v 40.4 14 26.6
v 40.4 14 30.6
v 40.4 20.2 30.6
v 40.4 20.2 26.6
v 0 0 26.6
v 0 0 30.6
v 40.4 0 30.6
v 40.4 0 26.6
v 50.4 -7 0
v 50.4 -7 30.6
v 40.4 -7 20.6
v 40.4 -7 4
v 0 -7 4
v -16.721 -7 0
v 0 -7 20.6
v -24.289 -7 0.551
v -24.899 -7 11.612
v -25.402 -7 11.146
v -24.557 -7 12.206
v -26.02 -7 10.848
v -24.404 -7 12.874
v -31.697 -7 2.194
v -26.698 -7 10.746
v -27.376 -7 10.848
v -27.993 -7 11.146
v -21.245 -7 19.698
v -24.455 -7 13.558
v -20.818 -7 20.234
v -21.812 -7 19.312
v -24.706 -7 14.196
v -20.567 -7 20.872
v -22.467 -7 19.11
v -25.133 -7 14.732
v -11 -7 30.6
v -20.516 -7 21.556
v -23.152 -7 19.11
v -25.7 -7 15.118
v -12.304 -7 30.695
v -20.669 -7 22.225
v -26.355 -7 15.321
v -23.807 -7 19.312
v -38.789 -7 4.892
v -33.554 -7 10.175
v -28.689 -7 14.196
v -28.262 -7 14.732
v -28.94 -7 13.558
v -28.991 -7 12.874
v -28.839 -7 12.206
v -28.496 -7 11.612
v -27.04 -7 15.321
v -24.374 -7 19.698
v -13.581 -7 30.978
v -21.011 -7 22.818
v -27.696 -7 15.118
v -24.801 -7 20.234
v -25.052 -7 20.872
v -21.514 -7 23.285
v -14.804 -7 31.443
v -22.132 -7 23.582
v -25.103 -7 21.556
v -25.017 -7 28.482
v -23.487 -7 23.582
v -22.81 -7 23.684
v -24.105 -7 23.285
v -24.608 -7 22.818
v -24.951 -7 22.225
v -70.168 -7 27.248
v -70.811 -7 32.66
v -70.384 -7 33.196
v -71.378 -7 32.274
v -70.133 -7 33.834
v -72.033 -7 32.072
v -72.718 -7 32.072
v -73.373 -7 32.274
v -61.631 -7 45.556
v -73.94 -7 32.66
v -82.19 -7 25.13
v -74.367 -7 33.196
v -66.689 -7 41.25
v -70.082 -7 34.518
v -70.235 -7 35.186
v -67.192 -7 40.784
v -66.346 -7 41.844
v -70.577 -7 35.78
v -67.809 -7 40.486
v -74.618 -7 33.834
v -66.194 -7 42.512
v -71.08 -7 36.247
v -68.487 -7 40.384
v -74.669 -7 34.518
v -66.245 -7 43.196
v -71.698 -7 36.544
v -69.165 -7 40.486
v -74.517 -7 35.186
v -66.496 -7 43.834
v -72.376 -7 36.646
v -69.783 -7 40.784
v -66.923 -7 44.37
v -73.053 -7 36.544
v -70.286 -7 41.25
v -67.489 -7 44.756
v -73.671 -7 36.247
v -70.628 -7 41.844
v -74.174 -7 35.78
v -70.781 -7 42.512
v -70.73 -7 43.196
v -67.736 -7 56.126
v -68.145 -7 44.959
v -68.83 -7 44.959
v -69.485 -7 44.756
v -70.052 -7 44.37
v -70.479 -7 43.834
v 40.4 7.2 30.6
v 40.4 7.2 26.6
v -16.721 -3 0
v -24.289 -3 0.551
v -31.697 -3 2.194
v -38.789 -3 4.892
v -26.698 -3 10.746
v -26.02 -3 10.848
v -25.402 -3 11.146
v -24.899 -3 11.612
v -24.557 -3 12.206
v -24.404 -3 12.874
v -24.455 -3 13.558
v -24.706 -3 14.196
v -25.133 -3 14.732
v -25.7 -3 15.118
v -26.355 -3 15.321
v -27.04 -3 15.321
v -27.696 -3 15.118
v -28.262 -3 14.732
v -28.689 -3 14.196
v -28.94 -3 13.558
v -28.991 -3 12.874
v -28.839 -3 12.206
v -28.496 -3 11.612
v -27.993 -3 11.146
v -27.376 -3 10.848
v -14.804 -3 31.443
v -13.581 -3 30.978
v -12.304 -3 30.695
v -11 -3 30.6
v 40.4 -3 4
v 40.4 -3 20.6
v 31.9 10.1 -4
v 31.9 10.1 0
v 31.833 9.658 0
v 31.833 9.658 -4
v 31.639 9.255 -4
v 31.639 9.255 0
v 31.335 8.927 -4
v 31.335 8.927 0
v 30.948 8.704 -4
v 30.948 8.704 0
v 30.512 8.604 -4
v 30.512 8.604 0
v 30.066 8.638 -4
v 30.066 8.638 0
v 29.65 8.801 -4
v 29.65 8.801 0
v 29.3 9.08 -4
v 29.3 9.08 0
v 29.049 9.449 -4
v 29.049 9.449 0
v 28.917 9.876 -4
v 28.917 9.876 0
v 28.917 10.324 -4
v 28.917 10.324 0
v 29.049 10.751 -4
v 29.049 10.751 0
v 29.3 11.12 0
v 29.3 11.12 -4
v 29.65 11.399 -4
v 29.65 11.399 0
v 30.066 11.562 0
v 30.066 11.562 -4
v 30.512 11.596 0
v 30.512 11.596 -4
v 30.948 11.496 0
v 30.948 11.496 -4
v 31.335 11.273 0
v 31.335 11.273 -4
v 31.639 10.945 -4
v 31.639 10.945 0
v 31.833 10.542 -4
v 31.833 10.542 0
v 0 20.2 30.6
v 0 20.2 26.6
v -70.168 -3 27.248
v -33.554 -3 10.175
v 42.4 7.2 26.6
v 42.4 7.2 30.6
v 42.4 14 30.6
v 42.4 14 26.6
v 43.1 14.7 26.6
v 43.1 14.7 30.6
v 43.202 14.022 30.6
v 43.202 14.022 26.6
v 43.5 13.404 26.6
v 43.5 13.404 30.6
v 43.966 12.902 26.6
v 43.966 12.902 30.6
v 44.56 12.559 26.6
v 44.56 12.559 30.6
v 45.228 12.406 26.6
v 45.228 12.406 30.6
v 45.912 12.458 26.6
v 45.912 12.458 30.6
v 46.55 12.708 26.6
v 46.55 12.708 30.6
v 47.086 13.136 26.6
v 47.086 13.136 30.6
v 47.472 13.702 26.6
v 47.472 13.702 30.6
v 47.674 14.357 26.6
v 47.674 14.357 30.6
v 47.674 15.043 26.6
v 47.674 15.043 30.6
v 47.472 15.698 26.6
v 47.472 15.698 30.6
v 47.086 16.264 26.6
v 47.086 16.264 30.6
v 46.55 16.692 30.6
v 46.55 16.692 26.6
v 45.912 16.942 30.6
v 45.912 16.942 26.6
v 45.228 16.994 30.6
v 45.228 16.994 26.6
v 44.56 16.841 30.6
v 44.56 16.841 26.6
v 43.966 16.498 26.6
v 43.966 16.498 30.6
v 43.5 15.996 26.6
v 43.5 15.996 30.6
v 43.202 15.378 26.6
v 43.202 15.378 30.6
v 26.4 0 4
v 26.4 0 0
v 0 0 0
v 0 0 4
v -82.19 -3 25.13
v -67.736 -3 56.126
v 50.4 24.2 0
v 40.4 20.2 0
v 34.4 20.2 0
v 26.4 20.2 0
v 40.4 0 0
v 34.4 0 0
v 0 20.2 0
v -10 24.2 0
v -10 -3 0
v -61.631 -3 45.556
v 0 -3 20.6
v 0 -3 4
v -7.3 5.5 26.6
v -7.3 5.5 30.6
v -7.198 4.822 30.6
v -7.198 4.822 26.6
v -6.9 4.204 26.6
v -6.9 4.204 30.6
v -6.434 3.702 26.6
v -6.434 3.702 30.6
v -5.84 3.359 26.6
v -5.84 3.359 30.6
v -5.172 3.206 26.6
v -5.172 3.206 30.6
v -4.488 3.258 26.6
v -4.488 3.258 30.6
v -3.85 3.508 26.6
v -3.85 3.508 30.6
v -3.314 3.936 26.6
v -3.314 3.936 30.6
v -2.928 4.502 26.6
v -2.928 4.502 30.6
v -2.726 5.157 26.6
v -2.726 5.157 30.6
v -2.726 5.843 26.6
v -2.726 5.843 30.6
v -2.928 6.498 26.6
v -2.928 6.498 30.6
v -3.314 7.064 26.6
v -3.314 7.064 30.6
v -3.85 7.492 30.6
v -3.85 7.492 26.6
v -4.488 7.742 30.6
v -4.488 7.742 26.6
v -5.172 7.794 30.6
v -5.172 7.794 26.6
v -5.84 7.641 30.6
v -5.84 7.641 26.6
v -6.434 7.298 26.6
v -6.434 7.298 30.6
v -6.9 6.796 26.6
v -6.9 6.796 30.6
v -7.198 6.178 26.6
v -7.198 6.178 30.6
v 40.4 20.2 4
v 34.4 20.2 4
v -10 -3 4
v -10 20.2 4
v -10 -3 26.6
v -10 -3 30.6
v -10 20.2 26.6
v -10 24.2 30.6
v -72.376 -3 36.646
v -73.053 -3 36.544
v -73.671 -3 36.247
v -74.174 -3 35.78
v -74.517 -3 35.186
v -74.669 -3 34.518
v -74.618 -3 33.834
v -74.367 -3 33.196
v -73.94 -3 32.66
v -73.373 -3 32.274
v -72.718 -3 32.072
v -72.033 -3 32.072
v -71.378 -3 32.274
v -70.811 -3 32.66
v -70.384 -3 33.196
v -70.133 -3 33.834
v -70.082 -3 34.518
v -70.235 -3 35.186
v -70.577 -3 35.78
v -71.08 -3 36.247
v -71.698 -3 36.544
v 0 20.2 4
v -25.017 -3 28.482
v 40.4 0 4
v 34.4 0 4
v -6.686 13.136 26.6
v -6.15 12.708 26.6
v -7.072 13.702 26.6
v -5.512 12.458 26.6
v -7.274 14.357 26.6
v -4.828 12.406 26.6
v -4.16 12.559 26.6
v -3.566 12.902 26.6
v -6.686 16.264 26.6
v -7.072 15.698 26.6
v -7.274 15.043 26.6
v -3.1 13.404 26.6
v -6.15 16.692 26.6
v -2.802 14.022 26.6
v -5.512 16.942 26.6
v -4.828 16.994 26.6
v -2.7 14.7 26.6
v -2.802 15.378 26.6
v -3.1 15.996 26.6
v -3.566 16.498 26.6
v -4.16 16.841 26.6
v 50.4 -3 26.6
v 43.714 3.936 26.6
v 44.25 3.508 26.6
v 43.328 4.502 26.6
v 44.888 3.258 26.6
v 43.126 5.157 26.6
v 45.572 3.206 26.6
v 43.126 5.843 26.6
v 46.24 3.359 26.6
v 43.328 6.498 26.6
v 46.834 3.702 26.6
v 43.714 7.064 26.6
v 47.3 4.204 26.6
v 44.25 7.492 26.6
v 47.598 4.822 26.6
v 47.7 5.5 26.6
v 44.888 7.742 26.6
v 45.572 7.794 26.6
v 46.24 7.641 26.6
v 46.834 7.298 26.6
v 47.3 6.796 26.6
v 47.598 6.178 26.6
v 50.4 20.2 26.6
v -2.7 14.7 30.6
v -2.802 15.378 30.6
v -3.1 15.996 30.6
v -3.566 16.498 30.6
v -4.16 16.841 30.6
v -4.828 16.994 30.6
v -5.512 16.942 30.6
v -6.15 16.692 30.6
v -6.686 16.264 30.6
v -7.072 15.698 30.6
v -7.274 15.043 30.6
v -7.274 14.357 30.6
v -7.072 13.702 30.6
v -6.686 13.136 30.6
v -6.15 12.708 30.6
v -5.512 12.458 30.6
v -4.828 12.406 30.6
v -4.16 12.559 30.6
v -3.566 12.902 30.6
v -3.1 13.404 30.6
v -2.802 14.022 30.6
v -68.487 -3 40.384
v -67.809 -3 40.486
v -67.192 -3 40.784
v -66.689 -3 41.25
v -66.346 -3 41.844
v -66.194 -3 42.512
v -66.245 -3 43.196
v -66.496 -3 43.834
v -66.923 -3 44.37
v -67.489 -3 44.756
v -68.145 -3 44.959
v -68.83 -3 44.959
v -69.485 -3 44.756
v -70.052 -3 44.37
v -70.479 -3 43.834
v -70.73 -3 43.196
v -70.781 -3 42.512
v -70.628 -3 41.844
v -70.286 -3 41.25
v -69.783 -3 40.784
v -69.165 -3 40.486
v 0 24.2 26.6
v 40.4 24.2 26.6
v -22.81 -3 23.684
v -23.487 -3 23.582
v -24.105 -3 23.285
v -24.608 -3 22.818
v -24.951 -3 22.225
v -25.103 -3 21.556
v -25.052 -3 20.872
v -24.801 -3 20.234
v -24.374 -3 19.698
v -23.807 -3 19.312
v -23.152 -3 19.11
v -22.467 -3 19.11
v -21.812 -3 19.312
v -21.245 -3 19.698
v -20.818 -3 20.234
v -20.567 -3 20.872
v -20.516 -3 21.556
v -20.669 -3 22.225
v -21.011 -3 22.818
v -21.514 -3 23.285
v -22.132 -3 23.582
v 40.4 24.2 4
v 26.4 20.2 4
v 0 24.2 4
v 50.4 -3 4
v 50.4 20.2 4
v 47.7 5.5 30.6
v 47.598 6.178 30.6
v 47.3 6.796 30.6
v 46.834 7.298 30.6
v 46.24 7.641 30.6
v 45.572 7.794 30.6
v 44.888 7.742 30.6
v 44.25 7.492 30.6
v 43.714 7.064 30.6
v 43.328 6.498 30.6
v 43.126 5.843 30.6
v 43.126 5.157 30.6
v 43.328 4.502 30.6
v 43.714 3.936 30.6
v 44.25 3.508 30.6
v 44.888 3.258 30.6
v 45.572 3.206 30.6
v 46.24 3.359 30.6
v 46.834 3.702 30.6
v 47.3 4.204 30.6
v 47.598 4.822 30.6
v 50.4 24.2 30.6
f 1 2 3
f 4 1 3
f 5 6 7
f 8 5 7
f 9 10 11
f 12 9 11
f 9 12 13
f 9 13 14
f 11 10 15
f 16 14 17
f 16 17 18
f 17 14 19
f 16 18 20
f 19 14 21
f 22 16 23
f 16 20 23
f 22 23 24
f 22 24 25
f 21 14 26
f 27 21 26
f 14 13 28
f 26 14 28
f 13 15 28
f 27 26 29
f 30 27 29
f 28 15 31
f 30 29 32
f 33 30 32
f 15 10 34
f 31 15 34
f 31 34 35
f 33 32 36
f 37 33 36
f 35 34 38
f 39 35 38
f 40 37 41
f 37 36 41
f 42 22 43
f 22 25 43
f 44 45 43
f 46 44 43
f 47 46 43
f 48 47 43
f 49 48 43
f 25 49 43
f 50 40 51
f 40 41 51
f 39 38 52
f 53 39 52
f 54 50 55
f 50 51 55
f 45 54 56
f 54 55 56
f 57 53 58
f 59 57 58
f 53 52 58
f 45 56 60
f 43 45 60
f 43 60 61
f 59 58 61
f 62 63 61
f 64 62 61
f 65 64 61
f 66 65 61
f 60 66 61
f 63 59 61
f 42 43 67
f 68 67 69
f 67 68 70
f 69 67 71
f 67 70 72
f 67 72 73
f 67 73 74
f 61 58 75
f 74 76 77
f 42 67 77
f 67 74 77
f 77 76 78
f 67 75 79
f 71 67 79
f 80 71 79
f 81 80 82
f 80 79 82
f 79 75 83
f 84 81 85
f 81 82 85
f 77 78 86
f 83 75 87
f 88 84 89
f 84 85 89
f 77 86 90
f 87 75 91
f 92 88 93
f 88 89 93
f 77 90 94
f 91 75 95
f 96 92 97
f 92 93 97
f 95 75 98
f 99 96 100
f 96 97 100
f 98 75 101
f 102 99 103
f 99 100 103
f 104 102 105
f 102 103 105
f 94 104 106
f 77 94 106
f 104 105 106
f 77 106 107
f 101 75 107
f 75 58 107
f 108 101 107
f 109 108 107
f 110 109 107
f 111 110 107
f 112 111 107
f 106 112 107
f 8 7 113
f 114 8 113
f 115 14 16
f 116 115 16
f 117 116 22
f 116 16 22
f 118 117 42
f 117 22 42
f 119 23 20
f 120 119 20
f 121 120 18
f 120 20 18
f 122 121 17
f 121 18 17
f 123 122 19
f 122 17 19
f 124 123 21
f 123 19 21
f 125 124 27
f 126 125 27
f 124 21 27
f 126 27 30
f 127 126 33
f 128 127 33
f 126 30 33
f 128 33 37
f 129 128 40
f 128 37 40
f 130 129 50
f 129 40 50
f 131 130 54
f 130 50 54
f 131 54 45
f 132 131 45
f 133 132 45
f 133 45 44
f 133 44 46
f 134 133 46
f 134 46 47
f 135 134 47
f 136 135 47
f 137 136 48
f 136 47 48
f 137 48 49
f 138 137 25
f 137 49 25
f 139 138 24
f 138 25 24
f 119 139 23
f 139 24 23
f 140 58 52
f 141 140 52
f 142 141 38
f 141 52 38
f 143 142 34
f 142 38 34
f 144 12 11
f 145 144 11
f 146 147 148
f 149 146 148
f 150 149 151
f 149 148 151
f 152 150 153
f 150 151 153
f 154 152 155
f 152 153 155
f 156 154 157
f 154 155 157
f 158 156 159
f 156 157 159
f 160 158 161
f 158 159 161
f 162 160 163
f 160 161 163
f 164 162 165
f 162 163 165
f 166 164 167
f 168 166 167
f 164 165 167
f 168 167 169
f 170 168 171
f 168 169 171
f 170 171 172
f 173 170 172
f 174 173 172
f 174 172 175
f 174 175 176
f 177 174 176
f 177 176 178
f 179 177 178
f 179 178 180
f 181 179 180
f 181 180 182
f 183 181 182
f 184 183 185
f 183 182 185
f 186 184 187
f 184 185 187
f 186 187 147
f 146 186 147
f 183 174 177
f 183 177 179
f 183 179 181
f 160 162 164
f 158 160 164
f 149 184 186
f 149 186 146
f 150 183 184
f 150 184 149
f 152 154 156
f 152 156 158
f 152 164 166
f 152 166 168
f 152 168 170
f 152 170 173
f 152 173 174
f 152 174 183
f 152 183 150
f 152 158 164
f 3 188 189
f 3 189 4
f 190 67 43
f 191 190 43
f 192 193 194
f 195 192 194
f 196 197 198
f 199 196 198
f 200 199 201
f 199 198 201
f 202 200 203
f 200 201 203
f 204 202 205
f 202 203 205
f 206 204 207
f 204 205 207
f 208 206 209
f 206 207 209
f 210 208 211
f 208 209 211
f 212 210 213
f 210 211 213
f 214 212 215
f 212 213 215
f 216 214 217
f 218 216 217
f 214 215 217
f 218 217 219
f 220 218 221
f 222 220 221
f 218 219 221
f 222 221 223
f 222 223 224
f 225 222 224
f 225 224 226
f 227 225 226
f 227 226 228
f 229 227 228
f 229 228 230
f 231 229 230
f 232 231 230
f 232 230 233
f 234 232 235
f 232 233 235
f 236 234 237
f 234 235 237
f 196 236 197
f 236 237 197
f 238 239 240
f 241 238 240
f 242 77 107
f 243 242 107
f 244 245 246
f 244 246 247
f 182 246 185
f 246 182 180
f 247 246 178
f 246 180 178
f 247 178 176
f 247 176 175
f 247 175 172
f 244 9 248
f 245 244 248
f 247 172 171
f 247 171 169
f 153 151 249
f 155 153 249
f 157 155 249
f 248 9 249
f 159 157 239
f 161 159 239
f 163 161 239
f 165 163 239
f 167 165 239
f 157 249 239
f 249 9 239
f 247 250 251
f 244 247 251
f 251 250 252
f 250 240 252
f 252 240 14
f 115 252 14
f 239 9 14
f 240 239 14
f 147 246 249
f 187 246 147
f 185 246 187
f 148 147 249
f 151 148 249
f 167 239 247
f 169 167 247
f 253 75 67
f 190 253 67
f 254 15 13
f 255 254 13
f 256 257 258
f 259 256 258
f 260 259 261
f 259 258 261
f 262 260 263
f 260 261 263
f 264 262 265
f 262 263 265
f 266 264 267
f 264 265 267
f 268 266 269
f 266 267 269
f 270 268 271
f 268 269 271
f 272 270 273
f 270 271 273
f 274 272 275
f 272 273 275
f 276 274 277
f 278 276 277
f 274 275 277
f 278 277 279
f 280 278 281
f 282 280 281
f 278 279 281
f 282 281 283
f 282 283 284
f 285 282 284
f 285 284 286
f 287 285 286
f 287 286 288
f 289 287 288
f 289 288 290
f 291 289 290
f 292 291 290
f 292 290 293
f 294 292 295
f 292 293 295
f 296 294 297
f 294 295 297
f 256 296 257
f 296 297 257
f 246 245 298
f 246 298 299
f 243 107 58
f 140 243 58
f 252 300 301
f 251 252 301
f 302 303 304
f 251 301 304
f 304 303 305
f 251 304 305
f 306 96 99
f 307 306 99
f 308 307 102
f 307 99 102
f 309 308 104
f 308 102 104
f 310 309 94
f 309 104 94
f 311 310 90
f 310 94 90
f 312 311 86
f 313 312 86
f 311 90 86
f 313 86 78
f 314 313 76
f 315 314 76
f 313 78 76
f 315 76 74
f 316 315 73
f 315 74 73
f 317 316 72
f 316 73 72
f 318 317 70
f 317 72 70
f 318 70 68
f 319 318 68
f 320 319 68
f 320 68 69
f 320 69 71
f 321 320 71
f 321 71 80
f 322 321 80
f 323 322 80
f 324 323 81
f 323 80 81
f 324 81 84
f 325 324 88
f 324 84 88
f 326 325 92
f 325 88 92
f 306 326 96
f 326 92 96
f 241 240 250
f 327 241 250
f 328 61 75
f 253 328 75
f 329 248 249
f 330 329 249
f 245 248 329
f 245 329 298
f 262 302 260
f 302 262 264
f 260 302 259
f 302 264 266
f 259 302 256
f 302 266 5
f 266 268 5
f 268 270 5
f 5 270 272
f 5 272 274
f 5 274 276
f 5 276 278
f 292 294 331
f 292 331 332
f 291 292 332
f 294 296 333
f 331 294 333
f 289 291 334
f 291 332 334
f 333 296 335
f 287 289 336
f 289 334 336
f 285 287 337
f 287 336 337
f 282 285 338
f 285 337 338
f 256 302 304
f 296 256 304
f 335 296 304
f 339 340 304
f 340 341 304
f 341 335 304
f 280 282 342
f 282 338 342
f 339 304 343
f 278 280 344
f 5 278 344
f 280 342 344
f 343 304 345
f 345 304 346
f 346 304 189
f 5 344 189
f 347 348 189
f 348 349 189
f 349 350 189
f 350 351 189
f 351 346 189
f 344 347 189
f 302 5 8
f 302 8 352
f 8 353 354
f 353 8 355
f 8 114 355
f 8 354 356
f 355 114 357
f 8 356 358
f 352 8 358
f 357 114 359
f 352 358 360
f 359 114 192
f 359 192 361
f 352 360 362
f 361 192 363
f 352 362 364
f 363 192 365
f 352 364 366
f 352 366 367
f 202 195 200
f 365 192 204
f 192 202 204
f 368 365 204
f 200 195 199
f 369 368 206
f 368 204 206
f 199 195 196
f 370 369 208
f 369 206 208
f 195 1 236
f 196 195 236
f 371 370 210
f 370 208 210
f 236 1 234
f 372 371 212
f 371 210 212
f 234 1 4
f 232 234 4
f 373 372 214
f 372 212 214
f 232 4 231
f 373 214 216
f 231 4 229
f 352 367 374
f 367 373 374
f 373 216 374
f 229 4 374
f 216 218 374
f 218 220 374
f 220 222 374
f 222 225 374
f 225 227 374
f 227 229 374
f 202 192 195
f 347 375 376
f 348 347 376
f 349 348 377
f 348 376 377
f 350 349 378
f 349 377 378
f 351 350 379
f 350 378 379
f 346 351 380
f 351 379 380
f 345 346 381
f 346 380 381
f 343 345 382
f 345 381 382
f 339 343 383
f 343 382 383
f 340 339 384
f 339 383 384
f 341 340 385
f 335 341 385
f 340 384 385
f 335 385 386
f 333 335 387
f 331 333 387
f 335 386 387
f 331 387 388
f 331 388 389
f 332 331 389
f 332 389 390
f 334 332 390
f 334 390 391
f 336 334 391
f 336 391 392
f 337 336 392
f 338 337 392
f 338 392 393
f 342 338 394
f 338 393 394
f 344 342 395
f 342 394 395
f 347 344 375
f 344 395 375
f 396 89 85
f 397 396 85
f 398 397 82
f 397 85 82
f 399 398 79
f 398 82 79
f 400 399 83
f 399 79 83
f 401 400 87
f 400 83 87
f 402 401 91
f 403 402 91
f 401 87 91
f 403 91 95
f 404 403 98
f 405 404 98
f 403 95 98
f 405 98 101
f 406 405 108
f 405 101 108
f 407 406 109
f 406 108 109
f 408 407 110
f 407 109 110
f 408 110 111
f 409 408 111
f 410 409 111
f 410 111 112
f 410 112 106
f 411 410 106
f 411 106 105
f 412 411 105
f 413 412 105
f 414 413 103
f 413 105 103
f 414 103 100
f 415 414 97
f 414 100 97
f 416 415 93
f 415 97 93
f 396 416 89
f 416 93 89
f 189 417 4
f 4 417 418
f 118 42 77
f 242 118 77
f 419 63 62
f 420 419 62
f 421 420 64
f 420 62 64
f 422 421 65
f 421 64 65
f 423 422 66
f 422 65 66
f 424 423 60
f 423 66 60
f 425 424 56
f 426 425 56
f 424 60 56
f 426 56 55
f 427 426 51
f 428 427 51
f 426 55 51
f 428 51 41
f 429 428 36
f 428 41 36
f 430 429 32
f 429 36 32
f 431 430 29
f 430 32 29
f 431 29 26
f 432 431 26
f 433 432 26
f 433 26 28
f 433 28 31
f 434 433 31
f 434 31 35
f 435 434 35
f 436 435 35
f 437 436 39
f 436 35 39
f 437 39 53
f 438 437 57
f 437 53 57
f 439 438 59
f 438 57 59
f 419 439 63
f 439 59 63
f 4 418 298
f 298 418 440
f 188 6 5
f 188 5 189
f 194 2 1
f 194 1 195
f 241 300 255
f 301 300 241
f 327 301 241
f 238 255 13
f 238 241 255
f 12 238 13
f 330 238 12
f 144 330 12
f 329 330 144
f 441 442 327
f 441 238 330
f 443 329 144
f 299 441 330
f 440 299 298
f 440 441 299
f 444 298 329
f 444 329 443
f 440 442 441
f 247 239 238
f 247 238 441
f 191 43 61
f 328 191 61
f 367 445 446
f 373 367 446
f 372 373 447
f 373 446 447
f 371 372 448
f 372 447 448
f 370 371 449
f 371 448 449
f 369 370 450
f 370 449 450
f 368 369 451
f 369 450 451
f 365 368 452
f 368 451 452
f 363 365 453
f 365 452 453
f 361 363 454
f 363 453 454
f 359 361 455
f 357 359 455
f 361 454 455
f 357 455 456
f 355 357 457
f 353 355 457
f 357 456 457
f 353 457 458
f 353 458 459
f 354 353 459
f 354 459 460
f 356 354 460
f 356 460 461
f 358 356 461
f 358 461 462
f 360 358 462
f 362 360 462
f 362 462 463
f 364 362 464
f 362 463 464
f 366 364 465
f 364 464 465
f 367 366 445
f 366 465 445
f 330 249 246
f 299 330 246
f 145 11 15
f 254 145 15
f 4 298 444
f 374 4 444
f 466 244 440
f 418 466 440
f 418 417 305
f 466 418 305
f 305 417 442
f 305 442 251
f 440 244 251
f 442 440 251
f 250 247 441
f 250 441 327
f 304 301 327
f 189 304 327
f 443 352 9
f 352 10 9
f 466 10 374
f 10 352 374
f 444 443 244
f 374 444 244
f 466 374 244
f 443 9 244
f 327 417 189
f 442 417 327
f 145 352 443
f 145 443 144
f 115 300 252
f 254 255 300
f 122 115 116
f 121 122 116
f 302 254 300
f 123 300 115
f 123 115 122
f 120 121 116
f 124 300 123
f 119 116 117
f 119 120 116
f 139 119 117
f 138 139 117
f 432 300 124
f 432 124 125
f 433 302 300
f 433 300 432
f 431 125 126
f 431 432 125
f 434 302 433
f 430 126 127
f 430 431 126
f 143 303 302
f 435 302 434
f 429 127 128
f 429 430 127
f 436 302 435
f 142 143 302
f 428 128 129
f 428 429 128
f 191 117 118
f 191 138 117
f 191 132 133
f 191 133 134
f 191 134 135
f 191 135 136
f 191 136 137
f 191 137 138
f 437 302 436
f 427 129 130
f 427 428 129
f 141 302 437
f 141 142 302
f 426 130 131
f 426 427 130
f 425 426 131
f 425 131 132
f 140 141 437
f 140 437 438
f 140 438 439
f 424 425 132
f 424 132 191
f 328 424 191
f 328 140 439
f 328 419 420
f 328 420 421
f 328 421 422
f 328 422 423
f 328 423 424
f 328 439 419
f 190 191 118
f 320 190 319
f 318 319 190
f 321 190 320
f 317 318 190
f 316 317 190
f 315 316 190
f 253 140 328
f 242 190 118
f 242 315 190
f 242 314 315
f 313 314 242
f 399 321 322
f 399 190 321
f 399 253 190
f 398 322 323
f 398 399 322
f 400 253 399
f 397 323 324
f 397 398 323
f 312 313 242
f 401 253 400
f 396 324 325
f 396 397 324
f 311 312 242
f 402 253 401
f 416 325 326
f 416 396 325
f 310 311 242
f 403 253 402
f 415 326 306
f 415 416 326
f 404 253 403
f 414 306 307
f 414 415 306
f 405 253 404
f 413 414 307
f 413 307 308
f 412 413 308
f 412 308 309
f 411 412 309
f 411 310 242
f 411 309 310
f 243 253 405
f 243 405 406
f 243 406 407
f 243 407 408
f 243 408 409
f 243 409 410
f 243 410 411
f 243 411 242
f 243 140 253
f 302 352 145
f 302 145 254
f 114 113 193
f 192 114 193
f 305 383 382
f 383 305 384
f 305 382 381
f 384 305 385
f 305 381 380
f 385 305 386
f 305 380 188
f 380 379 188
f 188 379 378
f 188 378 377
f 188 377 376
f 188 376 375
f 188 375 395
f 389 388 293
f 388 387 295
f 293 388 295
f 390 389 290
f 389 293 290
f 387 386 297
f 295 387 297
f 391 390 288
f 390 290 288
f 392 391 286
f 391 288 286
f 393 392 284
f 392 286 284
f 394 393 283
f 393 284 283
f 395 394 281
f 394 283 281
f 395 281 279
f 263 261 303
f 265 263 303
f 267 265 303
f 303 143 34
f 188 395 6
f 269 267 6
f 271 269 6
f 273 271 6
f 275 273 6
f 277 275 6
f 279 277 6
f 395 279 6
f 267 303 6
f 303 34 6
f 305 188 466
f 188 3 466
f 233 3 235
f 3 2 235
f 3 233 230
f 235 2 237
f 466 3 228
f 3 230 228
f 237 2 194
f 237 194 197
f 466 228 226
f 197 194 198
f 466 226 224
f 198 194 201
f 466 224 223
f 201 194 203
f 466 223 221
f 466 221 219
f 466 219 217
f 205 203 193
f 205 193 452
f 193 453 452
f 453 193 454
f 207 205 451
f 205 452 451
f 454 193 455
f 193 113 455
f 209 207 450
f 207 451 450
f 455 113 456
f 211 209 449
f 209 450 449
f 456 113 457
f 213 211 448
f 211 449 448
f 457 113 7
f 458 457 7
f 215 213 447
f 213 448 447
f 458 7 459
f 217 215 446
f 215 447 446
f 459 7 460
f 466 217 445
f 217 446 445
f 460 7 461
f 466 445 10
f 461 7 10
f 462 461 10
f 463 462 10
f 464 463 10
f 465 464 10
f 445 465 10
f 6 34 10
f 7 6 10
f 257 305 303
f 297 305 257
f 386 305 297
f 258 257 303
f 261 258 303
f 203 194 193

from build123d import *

# Parameters (mm, degrees)
SZKIC1_W                    = 60.4
SZKIC1_H                    = 34.2
DODANIE_WYCI_GNI_CIE1_DEPTH = 4
SZKIC2_R                    = 2.3
DODANIE_WYCI_GNI_CIE2_DEPTH = 4
SZKIC8_W                    = 60.4
SZKIC8_H                    = 32.2
SZKIC8_R                    = 2.3
SZKIC8_W_2                  = 40.4
SZKIC8_H_2                  = 20.2
DODANIE_WYCI_GNI_CIE3_DEPTH = 4
SZKIC10_R                   = 1.5
DODANIE_WYCI_GNI_CIE4_DEPTH = 4
DODANIE_WYCI_GNI_CIE5_START = -2
SZKIC11_W                   = 10
SZKIC11_H                   = 30.6
DODANIE_WYCI_GNI_CIE5_DEPTH = 5
WYTNIJ_WYCI_GNI_CIE1_DEPTH  = 3
SZKIC13_W                   = 6
SZKIC13_H                   = 20.2
SZKIC13_W_2                 = 26.4
WYTNIJ_WYCI_GNI_CIE2_DEPTH  = 4
WYTNIJ_WYCI_GNI_CIE3_REACH  = 94.401
SZKIC14_W                   = 2
SZKIC14_H                   = 6.8


with BuildPart() as part:
    # Szkic1 → Dodanie-wyciągnięcie1 (new body)
    with BuildSketch(Plane.XY):
        with Locations((20.2, 10.1)):
            Rectangle(SZKIC1_W, SZKIC1_H)
    extrude(amount=DODANIE_WYCI_GNI_CIE1_DEPTH)

    # Szkic2 → Dodanie-wyciągnięcie2 (add)
    with BuildSketch(Plane.XZ.offset(7)):
        with BuildLine():
            Line((-10, 4), (-10, 0))
            Line((-10, 0), (-16.721262857, 0))
            ThreePointArc((-16.721262857, 0), (-28.023032854, 1.237745118), (-38.789008699, 4.89230147))
            Line((-38.789008699, 4.89230147), (-82.189786852, 25.130416692))
            Line((-82.189786852, 25.130416692), (-67.736242301, 56.126143009))
            Line((-67.736242301, 56.126143009), (-14.803564356, 31.443229917))
            ThreePointArc((-14.803564356, 31.443229917), (-12.947956525, 30.813335936), (-11, 30.6))
            Line((-11, 30.6), (-10, 30.6))
            Line((-10, 30.6), (50.4, 30.6))
            Line((50.4, 30.6), (50.4, 4))
            Line((50.4, 4), (40.4, 4))
            Line((40.4, 4), (40.4, 20.6))
            Line((40.4, 20.6), (0, 20.6))
            Line((0, 20.6), (0, 4))
            Line((0, 4), (-10, 4))
        make_face()
        with Locations(Location((-68.487431637, 42.684204362, 0), (0, 0, 270))):
            Circle(SZKIC2_R, mode=Mode.SUBTRACT)
        with Locations(Location((-22.809519171, 21.384243971, 0), (0, 0, 90))):
            Circle(SZKIC2_R, mode=Mode.SUBTRACT)
        with Locations(Location((-26.697607179, 13.04621233, 0), (0, 0, 270))):
            Circle(SZKIC2_R, mode=Mode.SUBTRACT)
        with Locations(Location((-72.375519645, 34.346172722, 0), (0, 0, 90))):
            Circle(SZKIC2_R, mode=Mode.SUBTRACT)
        Polygon((-61.631492263, 45.555805882), (-70.16838115, 27.248388584), (-33.553546554, 10.17461081), (-25.016657666, 28.482028108), align=None, mode=Mode.SUBTRACT)
    extrude(amount=-DODANIE_WYCI_GNI_CIE2_DEPTH)

    # Szkic8 → Dodanie-wyciągnięcie3 (add)
    with BuildSketch(Plane.XY.offset(30.6)):
        with Locations((20.2, 9.1)):
            Rectangle(SZKIC8_W, SZKIC8_H)
        with Locations((-5, 14.7)):
            Circle(SZKIC8_R, mode=Mode.SUBTRACT)
        with Locations(Location((-5, 5.5, 0), (0, 0, 180))):
            Circle(SZKIC8_R, mode=Mode.SUBTRACT)
        with Locations((45.4, 5.5)):
            Circle(SZKIC8_R, mode=Mode.SUBTRACT)
        with Locations(Location((45.4, 14.7, 0), (0, 0, 180))):
            Circle(SZKIC8_R, mode=Mode.SUBTRACT)
        with Locations((20.2, 10.1)):
            Rectangle(SZKIC8_W_2, SZKIC8_H_2, mode=Mode.SUBTRACT)
    extrude(amount=-DODANIE_WYCI_GNI_CIE3_DEPTH)

    # Szkic10 → Dodanie-wyciągnięcie4 (add)
    with BuildSketch(Plane(origin=(0, 0, 0), x_dir=(-1, 0, 0), z_dir=(0, 0, -1))):
        with Locations(Location((-30.4, 10.1, 0), (0, 0, 180))):
            Circle(SZKIC10_R)
    extrude(amount=DODANIE_WYCI_GNI_CIE4_DEPTH)

    # Szkic11 → Dodanie-wyciągnięcie5 (add)
    with BuildSketch(Plane(origin=(0, 27.2, 0), x_dir=(1, 0, 0), z_dir=(0, 1, 0)).offset(DODANIE_WYCI_GNI_CIE5_START)):
        with Locations((-5, -15.3)):
            Rectangle(SZKIC11_W, SZKIC11_H)
        with Locations((45.4, -15.3)):
            Rectangle(SZKIC11_W, SZKIC11_H)
    extrude(amount=-DODANIE_WYCI_GNI_CIE5_DEPTH)

    # Szkic12 → Wytnij-wyciągnięcie1 (cut)
    with BuildSketch(Plane(origin=(0, 27.2, 0), x_dir=(1, 0, 0), z_dir=(0, 1, 0))):
        Polygon((-10, 0), (50.4, 0), (50.4, -4), (50.4, -30.6), (-10, -30.6), (-10, -4), align=None)
    extrude(amount=-WYTNIJ_WYCI_GNI_CIE1_DEPTH, mode=Mode.SUBTRACT)

    # Szkic13 → Wytnij-wyciągnięcie2 (cut)
    with BuildSketch(Plane(origin=(0, 0, 0), x_dir=(-1, 0, 0), z_dir=(0, 0, -1))):
        with Locations((-37.4, 10.1)):
            Rectangle(SZKIC13_W, SZKIC13_H)
        with Locations((-13.2, 10.1)):
            Rectangle(SZKIC13_W_2, SZKIC13_H)
    extrude(amount=-WYTNIJ_WYCI_GNI_CIE2_DEPTH, mode=Mode.SUBTRACT)

    # Szkic14 → Wytnij-wyciągnięcie3 (cut, up to next)
    with BuildSketch(Plane.XY.offset(30.6), mode=Mode.PRIVATE) as wytnij_wyci_gni_cie3_sk1:
        with Locations((41.4, 10.6)):
            Rectangle(SZKIC14_W, SZKIC14_H)
    wytnij_wyci_gni_cie3_tool1 = extrude(wytnij_wyci_gni_cie3_sk1.sketch, amount=-WYTNIJ_WYCI_GNI_CIE3_REACH, mode=Mode.PRIVATE) & part.part
    add(wytnij_wyci_gni_cie3_tool1.solids().sort_by_distance((41.4, 10.6, 30.6))[0], mode=Mode.SUBTRACT)


solid = part.part
